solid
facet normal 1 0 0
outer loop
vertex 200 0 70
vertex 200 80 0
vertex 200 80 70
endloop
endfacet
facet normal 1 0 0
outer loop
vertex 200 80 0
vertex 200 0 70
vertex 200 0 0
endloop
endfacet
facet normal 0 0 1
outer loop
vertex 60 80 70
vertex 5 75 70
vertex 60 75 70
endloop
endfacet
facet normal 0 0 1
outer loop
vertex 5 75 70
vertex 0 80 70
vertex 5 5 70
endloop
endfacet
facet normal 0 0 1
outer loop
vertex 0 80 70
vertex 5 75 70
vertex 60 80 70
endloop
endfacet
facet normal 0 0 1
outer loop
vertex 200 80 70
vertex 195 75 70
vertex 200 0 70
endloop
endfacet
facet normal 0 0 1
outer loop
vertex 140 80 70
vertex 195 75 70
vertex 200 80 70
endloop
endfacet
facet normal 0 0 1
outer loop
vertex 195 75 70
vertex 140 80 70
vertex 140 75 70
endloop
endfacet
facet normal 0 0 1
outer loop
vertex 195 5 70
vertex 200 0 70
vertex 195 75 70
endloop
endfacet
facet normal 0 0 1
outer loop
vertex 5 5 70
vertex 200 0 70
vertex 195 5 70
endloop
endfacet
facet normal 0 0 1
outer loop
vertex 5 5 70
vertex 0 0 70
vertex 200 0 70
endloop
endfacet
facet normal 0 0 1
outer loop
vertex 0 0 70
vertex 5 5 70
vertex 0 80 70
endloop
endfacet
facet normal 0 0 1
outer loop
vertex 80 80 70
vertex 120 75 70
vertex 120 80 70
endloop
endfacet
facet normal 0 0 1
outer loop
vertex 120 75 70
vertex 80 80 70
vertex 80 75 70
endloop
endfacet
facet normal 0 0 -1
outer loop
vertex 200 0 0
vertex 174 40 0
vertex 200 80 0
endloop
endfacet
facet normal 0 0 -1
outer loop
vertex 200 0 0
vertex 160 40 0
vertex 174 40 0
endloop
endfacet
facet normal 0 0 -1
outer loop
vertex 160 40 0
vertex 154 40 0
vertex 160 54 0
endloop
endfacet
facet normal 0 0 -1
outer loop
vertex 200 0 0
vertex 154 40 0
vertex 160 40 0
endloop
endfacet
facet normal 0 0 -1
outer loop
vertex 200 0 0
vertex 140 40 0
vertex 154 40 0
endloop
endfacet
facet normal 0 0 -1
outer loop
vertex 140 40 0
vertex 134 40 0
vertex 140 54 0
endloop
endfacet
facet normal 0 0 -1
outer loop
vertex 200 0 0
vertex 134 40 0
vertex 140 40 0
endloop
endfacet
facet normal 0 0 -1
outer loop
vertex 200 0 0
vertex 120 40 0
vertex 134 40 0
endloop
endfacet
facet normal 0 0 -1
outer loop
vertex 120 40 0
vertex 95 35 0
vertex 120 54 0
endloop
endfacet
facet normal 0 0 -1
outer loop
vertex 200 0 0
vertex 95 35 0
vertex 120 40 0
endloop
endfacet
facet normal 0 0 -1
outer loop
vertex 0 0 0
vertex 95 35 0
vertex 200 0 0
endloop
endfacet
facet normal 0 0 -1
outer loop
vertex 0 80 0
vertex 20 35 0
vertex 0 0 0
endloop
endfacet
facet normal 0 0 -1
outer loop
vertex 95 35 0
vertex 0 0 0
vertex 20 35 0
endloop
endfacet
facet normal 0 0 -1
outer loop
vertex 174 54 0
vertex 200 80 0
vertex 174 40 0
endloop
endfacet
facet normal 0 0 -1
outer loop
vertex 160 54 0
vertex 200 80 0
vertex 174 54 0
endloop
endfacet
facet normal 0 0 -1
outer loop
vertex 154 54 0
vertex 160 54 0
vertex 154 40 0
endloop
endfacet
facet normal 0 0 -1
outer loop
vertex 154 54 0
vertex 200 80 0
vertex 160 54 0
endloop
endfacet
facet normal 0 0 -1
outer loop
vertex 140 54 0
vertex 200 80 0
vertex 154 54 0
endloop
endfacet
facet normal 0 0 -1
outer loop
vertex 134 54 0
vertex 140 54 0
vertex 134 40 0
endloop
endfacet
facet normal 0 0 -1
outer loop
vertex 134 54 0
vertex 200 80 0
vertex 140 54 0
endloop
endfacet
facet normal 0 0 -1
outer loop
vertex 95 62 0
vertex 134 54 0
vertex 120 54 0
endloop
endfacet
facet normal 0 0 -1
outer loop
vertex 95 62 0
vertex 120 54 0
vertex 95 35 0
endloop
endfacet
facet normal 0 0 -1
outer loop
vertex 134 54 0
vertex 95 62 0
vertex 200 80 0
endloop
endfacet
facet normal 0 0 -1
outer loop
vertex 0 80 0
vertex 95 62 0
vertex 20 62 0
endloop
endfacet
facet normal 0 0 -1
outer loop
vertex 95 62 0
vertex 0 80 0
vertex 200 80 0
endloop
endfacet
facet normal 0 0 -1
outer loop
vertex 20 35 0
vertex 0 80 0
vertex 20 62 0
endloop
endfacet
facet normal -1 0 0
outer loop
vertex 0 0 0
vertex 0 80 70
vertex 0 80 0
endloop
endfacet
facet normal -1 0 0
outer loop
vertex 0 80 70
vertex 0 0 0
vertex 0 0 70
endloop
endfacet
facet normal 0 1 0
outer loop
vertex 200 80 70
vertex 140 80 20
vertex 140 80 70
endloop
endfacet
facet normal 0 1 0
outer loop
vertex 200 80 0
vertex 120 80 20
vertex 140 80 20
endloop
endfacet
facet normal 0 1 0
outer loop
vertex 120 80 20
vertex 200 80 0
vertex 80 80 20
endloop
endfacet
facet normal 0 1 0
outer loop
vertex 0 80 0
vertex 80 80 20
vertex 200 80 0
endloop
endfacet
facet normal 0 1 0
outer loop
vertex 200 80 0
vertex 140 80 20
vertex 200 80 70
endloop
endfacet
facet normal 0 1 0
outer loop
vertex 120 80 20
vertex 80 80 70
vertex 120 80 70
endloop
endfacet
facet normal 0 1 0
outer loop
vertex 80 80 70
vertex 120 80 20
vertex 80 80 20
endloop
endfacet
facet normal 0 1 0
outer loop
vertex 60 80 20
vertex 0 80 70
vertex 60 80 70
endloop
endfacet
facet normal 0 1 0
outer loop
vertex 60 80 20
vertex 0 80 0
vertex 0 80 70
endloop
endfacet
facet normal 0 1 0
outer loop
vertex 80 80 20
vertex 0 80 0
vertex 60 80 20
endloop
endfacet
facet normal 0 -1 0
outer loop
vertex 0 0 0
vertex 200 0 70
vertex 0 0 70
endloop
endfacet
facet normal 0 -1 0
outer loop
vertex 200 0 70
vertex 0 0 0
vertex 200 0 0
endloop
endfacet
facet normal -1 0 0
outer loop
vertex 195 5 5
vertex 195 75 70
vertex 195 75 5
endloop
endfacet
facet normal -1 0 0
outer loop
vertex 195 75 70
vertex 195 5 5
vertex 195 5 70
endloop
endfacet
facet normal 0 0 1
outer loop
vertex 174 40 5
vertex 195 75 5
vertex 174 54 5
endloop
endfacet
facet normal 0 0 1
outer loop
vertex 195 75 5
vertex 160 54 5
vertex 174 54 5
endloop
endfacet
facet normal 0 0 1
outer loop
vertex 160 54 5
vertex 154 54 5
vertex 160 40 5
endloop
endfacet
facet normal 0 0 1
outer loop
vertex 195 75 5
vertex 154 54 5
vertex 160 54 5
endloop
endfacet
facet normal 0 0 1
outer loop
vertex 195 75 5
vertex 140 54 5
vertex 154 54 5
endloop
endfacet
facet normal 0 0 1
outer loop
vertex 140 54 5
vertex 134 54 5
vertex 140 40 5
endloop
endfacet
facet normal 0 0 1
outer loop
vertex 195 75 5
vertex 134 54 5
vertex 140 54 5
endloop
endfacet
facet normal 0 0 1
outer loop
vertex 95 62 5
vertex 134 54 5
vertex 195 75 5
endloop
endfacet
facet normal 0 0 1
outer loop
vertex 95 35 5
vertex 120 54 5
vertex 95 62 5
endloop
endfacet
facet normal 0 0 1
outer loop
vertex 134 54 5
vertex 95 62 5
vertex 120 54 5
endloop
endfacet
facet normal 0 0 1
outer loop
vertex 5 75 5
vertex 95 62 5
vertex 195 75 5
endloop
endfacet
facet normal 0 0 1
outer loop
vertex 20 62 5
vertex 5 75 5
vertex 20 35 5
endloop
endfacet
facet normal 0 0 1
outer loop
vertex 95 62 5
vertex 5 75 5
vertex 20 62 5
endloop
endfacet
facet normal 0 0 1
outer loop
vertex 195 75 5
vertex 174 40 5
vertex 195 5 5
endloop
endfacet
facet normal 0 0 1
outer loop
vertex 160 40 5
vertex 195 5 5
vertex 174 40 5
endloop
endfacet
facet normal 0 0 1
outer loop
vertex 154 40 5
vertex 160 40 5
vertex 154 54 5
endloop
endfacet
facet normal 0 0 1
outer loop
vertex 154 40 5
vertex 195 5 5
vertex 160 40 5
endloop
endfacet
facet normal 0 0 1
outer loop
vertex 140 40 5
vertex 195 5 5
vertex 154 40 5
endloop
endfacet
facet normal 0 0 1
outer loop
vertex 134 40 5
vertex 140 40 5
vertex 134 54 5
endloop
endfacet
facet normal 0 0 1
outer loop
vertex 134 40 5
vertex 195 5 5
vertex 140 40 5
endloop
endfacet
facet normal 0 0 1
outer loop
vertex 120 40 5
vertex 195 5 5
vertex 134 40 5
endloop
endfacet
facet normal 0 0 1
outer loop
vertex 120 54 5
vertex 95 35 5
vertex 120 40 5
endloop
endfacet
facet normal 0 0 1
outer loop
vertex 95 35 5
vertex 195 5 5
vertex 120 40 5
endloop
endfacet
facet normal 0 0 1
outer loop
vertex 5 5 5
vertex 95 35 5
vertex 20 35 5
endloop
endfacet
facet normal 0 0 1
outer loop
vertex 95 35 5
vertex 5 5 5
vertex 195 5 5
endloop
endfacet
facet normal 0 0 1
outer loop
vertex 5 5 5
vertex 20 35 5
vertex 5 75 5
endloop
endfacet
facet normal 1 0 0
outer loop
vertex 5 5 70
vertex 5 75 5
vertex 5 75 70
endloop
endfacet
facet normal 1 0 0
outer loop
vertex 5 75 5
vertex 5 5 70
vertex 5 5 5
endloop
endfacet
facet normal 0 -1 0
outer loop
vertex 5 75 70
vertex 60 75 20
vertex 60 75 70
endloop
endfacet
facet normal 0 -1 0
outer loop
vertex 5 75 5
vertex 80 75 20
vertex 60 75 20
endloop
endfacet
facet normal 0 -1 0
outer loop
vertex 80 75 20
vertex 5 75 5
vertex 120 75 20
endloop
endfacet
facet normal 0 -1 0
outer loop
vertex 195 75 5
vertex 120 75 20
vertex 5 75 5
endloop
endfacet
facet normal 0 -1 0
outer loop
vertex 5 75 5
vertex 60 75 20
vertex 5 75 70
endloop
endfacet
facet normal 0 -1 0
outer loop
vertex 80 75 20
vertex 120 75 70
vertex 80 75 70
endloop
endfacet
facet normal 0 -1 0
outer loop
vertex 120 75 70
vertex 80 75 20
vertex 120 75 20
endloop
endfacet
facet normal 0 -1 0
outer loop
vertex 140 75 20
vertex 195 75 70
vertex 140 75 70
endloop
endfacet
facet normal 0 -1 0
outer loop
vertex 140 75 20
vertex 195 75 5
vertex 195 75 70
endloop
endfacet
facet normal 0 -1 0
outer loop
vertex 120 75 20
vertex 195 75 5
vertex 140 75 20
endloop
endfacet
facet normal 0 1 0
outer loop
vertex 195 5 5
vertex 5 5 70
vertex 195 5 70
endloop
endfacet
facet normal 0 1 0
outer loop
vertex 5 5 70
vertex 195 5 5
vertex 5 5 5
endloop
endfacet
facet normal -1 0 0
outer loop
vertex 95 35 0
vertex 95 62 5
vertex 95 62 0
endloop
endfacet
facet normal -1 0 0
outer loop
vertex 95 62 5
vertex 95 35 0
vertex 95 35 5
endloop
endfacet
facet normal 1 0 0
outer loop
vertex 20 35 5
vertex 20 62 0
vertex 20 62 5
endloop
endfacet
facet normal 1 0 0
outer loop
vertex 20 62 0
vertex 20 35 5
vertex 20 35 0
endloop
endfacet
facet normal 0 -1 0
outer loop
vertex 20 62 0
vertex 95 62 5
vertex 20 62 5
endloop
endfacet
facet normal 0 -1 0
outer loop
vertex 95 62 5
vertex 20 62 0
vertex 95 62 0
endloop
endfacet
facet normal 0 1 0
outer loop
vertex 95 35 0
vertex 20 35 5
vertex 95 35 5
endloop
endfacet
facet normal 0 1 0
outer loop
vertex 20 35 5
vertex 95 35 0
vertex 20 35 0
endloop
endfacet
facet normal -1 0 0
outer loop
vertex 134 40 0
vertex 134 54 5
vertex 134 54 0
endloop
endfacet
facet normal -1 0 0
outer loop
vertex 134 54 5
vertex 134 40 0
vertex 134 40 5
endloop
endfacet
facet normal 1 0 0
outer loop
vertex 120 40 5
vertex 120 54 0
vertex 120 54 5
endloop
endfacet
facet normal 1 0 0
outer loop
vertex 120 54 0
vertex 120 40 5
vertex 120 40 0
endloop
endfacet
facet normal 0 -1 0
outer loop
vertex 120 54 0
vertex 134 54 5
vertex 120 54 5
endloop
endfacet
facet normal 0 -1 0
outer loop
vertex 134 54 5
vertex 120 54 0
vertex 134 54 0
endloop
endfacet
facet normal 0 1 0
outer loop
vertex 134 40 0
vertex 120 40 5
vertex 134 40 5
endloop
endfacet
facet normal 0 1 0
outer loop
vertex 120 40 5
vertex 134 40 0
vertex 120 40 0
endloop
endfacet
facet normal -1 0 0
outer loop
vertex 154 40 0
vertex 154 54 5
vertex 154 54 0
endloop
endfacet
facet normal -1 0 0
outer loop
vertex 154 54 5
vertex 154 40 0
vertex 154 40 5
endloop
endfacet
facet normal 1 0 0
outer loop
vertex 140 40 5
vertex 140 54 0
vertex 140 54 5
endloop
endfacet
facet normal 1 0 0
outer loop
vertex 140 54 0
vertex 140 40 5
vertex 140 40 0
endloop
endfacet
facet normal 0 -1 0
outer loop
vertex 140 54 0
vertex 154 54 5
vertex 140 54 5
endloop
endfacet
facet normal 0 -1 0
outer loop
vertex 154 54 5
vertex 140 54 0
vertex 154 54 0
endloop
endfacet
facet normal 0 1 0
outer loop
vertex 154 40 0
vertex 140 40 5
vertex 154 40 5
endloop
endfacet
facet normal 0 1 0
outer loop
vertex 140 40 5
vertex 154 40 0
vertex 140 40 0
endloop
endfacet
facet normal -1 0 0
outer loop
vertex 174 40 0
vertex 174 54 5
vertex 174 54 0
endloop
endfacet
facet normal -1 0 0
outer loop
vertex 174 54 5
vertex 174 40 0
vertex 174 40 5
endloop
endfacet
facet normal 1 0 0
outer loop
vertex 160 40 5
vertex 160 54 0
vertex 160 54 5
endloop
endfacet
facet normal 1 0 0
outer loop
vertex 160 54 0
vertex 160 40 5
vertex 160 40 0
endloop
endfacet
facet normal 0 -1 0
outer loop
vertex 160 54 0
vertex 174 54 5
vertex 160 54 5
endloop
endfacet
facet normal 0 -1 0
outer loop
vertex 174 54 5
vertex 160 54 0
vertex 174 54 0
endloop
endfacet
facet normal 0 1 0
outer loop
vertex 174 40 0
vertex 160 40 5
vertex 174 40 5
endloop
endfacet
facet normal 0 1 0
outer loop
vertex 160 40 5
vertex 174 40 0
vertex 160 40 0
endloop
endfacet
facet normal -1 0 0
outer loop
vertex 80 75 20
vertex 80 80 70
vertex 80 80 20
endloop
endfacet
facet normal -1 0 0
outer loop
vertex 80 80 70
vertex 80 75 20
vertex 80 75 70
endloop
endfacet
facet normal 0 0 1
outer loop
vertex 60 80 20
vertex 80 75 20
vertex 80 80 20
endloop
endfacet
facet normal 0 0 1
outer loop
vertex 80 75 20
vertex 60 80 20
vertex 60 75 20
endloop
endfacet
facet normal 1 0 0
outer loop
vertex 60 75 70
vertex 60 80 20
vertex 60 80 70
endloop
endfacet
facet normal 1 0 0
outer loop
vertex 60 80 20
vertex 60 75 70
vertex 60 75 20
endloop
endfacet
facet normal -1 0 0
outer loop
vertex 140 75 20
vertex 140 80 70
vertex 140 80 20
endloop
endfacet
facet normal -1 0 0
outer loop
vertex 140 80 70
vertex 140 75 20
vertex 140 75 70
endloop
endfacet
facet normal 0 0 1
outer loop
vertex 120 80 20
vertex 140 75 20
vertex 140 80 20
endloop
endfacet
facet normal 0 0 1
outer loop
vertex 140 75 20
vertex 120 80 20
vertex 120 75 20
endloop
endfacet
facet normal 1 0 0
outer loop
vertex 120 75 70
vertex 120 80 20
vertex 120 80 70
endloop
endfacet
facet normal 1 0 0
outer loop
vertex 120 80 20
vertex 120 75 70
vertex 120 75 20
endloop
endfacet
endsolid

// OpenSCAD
difference(){
    cube([200, 80, 70]);
    translate([5, 5, 5]){
            cube([190, 70, 70]);
        }
    translate([20, 35, -4]){
        cube([75, 27, 10]);
        }
    translate([120, 40, -4]){
        cube([14, 14, 10]);
        }
    translate([140, 40, -4]){
        cube([14, 14, 10]);
        }
    translate([160, 40, -4]){
        cube([14, 14, 10]);
        }
    translate([60, 70, 20]){
        cube([20, 20, 80]);
        }
    translate([120, 70, 20]){
        cube([20, 20, 80]);
        }
    }
